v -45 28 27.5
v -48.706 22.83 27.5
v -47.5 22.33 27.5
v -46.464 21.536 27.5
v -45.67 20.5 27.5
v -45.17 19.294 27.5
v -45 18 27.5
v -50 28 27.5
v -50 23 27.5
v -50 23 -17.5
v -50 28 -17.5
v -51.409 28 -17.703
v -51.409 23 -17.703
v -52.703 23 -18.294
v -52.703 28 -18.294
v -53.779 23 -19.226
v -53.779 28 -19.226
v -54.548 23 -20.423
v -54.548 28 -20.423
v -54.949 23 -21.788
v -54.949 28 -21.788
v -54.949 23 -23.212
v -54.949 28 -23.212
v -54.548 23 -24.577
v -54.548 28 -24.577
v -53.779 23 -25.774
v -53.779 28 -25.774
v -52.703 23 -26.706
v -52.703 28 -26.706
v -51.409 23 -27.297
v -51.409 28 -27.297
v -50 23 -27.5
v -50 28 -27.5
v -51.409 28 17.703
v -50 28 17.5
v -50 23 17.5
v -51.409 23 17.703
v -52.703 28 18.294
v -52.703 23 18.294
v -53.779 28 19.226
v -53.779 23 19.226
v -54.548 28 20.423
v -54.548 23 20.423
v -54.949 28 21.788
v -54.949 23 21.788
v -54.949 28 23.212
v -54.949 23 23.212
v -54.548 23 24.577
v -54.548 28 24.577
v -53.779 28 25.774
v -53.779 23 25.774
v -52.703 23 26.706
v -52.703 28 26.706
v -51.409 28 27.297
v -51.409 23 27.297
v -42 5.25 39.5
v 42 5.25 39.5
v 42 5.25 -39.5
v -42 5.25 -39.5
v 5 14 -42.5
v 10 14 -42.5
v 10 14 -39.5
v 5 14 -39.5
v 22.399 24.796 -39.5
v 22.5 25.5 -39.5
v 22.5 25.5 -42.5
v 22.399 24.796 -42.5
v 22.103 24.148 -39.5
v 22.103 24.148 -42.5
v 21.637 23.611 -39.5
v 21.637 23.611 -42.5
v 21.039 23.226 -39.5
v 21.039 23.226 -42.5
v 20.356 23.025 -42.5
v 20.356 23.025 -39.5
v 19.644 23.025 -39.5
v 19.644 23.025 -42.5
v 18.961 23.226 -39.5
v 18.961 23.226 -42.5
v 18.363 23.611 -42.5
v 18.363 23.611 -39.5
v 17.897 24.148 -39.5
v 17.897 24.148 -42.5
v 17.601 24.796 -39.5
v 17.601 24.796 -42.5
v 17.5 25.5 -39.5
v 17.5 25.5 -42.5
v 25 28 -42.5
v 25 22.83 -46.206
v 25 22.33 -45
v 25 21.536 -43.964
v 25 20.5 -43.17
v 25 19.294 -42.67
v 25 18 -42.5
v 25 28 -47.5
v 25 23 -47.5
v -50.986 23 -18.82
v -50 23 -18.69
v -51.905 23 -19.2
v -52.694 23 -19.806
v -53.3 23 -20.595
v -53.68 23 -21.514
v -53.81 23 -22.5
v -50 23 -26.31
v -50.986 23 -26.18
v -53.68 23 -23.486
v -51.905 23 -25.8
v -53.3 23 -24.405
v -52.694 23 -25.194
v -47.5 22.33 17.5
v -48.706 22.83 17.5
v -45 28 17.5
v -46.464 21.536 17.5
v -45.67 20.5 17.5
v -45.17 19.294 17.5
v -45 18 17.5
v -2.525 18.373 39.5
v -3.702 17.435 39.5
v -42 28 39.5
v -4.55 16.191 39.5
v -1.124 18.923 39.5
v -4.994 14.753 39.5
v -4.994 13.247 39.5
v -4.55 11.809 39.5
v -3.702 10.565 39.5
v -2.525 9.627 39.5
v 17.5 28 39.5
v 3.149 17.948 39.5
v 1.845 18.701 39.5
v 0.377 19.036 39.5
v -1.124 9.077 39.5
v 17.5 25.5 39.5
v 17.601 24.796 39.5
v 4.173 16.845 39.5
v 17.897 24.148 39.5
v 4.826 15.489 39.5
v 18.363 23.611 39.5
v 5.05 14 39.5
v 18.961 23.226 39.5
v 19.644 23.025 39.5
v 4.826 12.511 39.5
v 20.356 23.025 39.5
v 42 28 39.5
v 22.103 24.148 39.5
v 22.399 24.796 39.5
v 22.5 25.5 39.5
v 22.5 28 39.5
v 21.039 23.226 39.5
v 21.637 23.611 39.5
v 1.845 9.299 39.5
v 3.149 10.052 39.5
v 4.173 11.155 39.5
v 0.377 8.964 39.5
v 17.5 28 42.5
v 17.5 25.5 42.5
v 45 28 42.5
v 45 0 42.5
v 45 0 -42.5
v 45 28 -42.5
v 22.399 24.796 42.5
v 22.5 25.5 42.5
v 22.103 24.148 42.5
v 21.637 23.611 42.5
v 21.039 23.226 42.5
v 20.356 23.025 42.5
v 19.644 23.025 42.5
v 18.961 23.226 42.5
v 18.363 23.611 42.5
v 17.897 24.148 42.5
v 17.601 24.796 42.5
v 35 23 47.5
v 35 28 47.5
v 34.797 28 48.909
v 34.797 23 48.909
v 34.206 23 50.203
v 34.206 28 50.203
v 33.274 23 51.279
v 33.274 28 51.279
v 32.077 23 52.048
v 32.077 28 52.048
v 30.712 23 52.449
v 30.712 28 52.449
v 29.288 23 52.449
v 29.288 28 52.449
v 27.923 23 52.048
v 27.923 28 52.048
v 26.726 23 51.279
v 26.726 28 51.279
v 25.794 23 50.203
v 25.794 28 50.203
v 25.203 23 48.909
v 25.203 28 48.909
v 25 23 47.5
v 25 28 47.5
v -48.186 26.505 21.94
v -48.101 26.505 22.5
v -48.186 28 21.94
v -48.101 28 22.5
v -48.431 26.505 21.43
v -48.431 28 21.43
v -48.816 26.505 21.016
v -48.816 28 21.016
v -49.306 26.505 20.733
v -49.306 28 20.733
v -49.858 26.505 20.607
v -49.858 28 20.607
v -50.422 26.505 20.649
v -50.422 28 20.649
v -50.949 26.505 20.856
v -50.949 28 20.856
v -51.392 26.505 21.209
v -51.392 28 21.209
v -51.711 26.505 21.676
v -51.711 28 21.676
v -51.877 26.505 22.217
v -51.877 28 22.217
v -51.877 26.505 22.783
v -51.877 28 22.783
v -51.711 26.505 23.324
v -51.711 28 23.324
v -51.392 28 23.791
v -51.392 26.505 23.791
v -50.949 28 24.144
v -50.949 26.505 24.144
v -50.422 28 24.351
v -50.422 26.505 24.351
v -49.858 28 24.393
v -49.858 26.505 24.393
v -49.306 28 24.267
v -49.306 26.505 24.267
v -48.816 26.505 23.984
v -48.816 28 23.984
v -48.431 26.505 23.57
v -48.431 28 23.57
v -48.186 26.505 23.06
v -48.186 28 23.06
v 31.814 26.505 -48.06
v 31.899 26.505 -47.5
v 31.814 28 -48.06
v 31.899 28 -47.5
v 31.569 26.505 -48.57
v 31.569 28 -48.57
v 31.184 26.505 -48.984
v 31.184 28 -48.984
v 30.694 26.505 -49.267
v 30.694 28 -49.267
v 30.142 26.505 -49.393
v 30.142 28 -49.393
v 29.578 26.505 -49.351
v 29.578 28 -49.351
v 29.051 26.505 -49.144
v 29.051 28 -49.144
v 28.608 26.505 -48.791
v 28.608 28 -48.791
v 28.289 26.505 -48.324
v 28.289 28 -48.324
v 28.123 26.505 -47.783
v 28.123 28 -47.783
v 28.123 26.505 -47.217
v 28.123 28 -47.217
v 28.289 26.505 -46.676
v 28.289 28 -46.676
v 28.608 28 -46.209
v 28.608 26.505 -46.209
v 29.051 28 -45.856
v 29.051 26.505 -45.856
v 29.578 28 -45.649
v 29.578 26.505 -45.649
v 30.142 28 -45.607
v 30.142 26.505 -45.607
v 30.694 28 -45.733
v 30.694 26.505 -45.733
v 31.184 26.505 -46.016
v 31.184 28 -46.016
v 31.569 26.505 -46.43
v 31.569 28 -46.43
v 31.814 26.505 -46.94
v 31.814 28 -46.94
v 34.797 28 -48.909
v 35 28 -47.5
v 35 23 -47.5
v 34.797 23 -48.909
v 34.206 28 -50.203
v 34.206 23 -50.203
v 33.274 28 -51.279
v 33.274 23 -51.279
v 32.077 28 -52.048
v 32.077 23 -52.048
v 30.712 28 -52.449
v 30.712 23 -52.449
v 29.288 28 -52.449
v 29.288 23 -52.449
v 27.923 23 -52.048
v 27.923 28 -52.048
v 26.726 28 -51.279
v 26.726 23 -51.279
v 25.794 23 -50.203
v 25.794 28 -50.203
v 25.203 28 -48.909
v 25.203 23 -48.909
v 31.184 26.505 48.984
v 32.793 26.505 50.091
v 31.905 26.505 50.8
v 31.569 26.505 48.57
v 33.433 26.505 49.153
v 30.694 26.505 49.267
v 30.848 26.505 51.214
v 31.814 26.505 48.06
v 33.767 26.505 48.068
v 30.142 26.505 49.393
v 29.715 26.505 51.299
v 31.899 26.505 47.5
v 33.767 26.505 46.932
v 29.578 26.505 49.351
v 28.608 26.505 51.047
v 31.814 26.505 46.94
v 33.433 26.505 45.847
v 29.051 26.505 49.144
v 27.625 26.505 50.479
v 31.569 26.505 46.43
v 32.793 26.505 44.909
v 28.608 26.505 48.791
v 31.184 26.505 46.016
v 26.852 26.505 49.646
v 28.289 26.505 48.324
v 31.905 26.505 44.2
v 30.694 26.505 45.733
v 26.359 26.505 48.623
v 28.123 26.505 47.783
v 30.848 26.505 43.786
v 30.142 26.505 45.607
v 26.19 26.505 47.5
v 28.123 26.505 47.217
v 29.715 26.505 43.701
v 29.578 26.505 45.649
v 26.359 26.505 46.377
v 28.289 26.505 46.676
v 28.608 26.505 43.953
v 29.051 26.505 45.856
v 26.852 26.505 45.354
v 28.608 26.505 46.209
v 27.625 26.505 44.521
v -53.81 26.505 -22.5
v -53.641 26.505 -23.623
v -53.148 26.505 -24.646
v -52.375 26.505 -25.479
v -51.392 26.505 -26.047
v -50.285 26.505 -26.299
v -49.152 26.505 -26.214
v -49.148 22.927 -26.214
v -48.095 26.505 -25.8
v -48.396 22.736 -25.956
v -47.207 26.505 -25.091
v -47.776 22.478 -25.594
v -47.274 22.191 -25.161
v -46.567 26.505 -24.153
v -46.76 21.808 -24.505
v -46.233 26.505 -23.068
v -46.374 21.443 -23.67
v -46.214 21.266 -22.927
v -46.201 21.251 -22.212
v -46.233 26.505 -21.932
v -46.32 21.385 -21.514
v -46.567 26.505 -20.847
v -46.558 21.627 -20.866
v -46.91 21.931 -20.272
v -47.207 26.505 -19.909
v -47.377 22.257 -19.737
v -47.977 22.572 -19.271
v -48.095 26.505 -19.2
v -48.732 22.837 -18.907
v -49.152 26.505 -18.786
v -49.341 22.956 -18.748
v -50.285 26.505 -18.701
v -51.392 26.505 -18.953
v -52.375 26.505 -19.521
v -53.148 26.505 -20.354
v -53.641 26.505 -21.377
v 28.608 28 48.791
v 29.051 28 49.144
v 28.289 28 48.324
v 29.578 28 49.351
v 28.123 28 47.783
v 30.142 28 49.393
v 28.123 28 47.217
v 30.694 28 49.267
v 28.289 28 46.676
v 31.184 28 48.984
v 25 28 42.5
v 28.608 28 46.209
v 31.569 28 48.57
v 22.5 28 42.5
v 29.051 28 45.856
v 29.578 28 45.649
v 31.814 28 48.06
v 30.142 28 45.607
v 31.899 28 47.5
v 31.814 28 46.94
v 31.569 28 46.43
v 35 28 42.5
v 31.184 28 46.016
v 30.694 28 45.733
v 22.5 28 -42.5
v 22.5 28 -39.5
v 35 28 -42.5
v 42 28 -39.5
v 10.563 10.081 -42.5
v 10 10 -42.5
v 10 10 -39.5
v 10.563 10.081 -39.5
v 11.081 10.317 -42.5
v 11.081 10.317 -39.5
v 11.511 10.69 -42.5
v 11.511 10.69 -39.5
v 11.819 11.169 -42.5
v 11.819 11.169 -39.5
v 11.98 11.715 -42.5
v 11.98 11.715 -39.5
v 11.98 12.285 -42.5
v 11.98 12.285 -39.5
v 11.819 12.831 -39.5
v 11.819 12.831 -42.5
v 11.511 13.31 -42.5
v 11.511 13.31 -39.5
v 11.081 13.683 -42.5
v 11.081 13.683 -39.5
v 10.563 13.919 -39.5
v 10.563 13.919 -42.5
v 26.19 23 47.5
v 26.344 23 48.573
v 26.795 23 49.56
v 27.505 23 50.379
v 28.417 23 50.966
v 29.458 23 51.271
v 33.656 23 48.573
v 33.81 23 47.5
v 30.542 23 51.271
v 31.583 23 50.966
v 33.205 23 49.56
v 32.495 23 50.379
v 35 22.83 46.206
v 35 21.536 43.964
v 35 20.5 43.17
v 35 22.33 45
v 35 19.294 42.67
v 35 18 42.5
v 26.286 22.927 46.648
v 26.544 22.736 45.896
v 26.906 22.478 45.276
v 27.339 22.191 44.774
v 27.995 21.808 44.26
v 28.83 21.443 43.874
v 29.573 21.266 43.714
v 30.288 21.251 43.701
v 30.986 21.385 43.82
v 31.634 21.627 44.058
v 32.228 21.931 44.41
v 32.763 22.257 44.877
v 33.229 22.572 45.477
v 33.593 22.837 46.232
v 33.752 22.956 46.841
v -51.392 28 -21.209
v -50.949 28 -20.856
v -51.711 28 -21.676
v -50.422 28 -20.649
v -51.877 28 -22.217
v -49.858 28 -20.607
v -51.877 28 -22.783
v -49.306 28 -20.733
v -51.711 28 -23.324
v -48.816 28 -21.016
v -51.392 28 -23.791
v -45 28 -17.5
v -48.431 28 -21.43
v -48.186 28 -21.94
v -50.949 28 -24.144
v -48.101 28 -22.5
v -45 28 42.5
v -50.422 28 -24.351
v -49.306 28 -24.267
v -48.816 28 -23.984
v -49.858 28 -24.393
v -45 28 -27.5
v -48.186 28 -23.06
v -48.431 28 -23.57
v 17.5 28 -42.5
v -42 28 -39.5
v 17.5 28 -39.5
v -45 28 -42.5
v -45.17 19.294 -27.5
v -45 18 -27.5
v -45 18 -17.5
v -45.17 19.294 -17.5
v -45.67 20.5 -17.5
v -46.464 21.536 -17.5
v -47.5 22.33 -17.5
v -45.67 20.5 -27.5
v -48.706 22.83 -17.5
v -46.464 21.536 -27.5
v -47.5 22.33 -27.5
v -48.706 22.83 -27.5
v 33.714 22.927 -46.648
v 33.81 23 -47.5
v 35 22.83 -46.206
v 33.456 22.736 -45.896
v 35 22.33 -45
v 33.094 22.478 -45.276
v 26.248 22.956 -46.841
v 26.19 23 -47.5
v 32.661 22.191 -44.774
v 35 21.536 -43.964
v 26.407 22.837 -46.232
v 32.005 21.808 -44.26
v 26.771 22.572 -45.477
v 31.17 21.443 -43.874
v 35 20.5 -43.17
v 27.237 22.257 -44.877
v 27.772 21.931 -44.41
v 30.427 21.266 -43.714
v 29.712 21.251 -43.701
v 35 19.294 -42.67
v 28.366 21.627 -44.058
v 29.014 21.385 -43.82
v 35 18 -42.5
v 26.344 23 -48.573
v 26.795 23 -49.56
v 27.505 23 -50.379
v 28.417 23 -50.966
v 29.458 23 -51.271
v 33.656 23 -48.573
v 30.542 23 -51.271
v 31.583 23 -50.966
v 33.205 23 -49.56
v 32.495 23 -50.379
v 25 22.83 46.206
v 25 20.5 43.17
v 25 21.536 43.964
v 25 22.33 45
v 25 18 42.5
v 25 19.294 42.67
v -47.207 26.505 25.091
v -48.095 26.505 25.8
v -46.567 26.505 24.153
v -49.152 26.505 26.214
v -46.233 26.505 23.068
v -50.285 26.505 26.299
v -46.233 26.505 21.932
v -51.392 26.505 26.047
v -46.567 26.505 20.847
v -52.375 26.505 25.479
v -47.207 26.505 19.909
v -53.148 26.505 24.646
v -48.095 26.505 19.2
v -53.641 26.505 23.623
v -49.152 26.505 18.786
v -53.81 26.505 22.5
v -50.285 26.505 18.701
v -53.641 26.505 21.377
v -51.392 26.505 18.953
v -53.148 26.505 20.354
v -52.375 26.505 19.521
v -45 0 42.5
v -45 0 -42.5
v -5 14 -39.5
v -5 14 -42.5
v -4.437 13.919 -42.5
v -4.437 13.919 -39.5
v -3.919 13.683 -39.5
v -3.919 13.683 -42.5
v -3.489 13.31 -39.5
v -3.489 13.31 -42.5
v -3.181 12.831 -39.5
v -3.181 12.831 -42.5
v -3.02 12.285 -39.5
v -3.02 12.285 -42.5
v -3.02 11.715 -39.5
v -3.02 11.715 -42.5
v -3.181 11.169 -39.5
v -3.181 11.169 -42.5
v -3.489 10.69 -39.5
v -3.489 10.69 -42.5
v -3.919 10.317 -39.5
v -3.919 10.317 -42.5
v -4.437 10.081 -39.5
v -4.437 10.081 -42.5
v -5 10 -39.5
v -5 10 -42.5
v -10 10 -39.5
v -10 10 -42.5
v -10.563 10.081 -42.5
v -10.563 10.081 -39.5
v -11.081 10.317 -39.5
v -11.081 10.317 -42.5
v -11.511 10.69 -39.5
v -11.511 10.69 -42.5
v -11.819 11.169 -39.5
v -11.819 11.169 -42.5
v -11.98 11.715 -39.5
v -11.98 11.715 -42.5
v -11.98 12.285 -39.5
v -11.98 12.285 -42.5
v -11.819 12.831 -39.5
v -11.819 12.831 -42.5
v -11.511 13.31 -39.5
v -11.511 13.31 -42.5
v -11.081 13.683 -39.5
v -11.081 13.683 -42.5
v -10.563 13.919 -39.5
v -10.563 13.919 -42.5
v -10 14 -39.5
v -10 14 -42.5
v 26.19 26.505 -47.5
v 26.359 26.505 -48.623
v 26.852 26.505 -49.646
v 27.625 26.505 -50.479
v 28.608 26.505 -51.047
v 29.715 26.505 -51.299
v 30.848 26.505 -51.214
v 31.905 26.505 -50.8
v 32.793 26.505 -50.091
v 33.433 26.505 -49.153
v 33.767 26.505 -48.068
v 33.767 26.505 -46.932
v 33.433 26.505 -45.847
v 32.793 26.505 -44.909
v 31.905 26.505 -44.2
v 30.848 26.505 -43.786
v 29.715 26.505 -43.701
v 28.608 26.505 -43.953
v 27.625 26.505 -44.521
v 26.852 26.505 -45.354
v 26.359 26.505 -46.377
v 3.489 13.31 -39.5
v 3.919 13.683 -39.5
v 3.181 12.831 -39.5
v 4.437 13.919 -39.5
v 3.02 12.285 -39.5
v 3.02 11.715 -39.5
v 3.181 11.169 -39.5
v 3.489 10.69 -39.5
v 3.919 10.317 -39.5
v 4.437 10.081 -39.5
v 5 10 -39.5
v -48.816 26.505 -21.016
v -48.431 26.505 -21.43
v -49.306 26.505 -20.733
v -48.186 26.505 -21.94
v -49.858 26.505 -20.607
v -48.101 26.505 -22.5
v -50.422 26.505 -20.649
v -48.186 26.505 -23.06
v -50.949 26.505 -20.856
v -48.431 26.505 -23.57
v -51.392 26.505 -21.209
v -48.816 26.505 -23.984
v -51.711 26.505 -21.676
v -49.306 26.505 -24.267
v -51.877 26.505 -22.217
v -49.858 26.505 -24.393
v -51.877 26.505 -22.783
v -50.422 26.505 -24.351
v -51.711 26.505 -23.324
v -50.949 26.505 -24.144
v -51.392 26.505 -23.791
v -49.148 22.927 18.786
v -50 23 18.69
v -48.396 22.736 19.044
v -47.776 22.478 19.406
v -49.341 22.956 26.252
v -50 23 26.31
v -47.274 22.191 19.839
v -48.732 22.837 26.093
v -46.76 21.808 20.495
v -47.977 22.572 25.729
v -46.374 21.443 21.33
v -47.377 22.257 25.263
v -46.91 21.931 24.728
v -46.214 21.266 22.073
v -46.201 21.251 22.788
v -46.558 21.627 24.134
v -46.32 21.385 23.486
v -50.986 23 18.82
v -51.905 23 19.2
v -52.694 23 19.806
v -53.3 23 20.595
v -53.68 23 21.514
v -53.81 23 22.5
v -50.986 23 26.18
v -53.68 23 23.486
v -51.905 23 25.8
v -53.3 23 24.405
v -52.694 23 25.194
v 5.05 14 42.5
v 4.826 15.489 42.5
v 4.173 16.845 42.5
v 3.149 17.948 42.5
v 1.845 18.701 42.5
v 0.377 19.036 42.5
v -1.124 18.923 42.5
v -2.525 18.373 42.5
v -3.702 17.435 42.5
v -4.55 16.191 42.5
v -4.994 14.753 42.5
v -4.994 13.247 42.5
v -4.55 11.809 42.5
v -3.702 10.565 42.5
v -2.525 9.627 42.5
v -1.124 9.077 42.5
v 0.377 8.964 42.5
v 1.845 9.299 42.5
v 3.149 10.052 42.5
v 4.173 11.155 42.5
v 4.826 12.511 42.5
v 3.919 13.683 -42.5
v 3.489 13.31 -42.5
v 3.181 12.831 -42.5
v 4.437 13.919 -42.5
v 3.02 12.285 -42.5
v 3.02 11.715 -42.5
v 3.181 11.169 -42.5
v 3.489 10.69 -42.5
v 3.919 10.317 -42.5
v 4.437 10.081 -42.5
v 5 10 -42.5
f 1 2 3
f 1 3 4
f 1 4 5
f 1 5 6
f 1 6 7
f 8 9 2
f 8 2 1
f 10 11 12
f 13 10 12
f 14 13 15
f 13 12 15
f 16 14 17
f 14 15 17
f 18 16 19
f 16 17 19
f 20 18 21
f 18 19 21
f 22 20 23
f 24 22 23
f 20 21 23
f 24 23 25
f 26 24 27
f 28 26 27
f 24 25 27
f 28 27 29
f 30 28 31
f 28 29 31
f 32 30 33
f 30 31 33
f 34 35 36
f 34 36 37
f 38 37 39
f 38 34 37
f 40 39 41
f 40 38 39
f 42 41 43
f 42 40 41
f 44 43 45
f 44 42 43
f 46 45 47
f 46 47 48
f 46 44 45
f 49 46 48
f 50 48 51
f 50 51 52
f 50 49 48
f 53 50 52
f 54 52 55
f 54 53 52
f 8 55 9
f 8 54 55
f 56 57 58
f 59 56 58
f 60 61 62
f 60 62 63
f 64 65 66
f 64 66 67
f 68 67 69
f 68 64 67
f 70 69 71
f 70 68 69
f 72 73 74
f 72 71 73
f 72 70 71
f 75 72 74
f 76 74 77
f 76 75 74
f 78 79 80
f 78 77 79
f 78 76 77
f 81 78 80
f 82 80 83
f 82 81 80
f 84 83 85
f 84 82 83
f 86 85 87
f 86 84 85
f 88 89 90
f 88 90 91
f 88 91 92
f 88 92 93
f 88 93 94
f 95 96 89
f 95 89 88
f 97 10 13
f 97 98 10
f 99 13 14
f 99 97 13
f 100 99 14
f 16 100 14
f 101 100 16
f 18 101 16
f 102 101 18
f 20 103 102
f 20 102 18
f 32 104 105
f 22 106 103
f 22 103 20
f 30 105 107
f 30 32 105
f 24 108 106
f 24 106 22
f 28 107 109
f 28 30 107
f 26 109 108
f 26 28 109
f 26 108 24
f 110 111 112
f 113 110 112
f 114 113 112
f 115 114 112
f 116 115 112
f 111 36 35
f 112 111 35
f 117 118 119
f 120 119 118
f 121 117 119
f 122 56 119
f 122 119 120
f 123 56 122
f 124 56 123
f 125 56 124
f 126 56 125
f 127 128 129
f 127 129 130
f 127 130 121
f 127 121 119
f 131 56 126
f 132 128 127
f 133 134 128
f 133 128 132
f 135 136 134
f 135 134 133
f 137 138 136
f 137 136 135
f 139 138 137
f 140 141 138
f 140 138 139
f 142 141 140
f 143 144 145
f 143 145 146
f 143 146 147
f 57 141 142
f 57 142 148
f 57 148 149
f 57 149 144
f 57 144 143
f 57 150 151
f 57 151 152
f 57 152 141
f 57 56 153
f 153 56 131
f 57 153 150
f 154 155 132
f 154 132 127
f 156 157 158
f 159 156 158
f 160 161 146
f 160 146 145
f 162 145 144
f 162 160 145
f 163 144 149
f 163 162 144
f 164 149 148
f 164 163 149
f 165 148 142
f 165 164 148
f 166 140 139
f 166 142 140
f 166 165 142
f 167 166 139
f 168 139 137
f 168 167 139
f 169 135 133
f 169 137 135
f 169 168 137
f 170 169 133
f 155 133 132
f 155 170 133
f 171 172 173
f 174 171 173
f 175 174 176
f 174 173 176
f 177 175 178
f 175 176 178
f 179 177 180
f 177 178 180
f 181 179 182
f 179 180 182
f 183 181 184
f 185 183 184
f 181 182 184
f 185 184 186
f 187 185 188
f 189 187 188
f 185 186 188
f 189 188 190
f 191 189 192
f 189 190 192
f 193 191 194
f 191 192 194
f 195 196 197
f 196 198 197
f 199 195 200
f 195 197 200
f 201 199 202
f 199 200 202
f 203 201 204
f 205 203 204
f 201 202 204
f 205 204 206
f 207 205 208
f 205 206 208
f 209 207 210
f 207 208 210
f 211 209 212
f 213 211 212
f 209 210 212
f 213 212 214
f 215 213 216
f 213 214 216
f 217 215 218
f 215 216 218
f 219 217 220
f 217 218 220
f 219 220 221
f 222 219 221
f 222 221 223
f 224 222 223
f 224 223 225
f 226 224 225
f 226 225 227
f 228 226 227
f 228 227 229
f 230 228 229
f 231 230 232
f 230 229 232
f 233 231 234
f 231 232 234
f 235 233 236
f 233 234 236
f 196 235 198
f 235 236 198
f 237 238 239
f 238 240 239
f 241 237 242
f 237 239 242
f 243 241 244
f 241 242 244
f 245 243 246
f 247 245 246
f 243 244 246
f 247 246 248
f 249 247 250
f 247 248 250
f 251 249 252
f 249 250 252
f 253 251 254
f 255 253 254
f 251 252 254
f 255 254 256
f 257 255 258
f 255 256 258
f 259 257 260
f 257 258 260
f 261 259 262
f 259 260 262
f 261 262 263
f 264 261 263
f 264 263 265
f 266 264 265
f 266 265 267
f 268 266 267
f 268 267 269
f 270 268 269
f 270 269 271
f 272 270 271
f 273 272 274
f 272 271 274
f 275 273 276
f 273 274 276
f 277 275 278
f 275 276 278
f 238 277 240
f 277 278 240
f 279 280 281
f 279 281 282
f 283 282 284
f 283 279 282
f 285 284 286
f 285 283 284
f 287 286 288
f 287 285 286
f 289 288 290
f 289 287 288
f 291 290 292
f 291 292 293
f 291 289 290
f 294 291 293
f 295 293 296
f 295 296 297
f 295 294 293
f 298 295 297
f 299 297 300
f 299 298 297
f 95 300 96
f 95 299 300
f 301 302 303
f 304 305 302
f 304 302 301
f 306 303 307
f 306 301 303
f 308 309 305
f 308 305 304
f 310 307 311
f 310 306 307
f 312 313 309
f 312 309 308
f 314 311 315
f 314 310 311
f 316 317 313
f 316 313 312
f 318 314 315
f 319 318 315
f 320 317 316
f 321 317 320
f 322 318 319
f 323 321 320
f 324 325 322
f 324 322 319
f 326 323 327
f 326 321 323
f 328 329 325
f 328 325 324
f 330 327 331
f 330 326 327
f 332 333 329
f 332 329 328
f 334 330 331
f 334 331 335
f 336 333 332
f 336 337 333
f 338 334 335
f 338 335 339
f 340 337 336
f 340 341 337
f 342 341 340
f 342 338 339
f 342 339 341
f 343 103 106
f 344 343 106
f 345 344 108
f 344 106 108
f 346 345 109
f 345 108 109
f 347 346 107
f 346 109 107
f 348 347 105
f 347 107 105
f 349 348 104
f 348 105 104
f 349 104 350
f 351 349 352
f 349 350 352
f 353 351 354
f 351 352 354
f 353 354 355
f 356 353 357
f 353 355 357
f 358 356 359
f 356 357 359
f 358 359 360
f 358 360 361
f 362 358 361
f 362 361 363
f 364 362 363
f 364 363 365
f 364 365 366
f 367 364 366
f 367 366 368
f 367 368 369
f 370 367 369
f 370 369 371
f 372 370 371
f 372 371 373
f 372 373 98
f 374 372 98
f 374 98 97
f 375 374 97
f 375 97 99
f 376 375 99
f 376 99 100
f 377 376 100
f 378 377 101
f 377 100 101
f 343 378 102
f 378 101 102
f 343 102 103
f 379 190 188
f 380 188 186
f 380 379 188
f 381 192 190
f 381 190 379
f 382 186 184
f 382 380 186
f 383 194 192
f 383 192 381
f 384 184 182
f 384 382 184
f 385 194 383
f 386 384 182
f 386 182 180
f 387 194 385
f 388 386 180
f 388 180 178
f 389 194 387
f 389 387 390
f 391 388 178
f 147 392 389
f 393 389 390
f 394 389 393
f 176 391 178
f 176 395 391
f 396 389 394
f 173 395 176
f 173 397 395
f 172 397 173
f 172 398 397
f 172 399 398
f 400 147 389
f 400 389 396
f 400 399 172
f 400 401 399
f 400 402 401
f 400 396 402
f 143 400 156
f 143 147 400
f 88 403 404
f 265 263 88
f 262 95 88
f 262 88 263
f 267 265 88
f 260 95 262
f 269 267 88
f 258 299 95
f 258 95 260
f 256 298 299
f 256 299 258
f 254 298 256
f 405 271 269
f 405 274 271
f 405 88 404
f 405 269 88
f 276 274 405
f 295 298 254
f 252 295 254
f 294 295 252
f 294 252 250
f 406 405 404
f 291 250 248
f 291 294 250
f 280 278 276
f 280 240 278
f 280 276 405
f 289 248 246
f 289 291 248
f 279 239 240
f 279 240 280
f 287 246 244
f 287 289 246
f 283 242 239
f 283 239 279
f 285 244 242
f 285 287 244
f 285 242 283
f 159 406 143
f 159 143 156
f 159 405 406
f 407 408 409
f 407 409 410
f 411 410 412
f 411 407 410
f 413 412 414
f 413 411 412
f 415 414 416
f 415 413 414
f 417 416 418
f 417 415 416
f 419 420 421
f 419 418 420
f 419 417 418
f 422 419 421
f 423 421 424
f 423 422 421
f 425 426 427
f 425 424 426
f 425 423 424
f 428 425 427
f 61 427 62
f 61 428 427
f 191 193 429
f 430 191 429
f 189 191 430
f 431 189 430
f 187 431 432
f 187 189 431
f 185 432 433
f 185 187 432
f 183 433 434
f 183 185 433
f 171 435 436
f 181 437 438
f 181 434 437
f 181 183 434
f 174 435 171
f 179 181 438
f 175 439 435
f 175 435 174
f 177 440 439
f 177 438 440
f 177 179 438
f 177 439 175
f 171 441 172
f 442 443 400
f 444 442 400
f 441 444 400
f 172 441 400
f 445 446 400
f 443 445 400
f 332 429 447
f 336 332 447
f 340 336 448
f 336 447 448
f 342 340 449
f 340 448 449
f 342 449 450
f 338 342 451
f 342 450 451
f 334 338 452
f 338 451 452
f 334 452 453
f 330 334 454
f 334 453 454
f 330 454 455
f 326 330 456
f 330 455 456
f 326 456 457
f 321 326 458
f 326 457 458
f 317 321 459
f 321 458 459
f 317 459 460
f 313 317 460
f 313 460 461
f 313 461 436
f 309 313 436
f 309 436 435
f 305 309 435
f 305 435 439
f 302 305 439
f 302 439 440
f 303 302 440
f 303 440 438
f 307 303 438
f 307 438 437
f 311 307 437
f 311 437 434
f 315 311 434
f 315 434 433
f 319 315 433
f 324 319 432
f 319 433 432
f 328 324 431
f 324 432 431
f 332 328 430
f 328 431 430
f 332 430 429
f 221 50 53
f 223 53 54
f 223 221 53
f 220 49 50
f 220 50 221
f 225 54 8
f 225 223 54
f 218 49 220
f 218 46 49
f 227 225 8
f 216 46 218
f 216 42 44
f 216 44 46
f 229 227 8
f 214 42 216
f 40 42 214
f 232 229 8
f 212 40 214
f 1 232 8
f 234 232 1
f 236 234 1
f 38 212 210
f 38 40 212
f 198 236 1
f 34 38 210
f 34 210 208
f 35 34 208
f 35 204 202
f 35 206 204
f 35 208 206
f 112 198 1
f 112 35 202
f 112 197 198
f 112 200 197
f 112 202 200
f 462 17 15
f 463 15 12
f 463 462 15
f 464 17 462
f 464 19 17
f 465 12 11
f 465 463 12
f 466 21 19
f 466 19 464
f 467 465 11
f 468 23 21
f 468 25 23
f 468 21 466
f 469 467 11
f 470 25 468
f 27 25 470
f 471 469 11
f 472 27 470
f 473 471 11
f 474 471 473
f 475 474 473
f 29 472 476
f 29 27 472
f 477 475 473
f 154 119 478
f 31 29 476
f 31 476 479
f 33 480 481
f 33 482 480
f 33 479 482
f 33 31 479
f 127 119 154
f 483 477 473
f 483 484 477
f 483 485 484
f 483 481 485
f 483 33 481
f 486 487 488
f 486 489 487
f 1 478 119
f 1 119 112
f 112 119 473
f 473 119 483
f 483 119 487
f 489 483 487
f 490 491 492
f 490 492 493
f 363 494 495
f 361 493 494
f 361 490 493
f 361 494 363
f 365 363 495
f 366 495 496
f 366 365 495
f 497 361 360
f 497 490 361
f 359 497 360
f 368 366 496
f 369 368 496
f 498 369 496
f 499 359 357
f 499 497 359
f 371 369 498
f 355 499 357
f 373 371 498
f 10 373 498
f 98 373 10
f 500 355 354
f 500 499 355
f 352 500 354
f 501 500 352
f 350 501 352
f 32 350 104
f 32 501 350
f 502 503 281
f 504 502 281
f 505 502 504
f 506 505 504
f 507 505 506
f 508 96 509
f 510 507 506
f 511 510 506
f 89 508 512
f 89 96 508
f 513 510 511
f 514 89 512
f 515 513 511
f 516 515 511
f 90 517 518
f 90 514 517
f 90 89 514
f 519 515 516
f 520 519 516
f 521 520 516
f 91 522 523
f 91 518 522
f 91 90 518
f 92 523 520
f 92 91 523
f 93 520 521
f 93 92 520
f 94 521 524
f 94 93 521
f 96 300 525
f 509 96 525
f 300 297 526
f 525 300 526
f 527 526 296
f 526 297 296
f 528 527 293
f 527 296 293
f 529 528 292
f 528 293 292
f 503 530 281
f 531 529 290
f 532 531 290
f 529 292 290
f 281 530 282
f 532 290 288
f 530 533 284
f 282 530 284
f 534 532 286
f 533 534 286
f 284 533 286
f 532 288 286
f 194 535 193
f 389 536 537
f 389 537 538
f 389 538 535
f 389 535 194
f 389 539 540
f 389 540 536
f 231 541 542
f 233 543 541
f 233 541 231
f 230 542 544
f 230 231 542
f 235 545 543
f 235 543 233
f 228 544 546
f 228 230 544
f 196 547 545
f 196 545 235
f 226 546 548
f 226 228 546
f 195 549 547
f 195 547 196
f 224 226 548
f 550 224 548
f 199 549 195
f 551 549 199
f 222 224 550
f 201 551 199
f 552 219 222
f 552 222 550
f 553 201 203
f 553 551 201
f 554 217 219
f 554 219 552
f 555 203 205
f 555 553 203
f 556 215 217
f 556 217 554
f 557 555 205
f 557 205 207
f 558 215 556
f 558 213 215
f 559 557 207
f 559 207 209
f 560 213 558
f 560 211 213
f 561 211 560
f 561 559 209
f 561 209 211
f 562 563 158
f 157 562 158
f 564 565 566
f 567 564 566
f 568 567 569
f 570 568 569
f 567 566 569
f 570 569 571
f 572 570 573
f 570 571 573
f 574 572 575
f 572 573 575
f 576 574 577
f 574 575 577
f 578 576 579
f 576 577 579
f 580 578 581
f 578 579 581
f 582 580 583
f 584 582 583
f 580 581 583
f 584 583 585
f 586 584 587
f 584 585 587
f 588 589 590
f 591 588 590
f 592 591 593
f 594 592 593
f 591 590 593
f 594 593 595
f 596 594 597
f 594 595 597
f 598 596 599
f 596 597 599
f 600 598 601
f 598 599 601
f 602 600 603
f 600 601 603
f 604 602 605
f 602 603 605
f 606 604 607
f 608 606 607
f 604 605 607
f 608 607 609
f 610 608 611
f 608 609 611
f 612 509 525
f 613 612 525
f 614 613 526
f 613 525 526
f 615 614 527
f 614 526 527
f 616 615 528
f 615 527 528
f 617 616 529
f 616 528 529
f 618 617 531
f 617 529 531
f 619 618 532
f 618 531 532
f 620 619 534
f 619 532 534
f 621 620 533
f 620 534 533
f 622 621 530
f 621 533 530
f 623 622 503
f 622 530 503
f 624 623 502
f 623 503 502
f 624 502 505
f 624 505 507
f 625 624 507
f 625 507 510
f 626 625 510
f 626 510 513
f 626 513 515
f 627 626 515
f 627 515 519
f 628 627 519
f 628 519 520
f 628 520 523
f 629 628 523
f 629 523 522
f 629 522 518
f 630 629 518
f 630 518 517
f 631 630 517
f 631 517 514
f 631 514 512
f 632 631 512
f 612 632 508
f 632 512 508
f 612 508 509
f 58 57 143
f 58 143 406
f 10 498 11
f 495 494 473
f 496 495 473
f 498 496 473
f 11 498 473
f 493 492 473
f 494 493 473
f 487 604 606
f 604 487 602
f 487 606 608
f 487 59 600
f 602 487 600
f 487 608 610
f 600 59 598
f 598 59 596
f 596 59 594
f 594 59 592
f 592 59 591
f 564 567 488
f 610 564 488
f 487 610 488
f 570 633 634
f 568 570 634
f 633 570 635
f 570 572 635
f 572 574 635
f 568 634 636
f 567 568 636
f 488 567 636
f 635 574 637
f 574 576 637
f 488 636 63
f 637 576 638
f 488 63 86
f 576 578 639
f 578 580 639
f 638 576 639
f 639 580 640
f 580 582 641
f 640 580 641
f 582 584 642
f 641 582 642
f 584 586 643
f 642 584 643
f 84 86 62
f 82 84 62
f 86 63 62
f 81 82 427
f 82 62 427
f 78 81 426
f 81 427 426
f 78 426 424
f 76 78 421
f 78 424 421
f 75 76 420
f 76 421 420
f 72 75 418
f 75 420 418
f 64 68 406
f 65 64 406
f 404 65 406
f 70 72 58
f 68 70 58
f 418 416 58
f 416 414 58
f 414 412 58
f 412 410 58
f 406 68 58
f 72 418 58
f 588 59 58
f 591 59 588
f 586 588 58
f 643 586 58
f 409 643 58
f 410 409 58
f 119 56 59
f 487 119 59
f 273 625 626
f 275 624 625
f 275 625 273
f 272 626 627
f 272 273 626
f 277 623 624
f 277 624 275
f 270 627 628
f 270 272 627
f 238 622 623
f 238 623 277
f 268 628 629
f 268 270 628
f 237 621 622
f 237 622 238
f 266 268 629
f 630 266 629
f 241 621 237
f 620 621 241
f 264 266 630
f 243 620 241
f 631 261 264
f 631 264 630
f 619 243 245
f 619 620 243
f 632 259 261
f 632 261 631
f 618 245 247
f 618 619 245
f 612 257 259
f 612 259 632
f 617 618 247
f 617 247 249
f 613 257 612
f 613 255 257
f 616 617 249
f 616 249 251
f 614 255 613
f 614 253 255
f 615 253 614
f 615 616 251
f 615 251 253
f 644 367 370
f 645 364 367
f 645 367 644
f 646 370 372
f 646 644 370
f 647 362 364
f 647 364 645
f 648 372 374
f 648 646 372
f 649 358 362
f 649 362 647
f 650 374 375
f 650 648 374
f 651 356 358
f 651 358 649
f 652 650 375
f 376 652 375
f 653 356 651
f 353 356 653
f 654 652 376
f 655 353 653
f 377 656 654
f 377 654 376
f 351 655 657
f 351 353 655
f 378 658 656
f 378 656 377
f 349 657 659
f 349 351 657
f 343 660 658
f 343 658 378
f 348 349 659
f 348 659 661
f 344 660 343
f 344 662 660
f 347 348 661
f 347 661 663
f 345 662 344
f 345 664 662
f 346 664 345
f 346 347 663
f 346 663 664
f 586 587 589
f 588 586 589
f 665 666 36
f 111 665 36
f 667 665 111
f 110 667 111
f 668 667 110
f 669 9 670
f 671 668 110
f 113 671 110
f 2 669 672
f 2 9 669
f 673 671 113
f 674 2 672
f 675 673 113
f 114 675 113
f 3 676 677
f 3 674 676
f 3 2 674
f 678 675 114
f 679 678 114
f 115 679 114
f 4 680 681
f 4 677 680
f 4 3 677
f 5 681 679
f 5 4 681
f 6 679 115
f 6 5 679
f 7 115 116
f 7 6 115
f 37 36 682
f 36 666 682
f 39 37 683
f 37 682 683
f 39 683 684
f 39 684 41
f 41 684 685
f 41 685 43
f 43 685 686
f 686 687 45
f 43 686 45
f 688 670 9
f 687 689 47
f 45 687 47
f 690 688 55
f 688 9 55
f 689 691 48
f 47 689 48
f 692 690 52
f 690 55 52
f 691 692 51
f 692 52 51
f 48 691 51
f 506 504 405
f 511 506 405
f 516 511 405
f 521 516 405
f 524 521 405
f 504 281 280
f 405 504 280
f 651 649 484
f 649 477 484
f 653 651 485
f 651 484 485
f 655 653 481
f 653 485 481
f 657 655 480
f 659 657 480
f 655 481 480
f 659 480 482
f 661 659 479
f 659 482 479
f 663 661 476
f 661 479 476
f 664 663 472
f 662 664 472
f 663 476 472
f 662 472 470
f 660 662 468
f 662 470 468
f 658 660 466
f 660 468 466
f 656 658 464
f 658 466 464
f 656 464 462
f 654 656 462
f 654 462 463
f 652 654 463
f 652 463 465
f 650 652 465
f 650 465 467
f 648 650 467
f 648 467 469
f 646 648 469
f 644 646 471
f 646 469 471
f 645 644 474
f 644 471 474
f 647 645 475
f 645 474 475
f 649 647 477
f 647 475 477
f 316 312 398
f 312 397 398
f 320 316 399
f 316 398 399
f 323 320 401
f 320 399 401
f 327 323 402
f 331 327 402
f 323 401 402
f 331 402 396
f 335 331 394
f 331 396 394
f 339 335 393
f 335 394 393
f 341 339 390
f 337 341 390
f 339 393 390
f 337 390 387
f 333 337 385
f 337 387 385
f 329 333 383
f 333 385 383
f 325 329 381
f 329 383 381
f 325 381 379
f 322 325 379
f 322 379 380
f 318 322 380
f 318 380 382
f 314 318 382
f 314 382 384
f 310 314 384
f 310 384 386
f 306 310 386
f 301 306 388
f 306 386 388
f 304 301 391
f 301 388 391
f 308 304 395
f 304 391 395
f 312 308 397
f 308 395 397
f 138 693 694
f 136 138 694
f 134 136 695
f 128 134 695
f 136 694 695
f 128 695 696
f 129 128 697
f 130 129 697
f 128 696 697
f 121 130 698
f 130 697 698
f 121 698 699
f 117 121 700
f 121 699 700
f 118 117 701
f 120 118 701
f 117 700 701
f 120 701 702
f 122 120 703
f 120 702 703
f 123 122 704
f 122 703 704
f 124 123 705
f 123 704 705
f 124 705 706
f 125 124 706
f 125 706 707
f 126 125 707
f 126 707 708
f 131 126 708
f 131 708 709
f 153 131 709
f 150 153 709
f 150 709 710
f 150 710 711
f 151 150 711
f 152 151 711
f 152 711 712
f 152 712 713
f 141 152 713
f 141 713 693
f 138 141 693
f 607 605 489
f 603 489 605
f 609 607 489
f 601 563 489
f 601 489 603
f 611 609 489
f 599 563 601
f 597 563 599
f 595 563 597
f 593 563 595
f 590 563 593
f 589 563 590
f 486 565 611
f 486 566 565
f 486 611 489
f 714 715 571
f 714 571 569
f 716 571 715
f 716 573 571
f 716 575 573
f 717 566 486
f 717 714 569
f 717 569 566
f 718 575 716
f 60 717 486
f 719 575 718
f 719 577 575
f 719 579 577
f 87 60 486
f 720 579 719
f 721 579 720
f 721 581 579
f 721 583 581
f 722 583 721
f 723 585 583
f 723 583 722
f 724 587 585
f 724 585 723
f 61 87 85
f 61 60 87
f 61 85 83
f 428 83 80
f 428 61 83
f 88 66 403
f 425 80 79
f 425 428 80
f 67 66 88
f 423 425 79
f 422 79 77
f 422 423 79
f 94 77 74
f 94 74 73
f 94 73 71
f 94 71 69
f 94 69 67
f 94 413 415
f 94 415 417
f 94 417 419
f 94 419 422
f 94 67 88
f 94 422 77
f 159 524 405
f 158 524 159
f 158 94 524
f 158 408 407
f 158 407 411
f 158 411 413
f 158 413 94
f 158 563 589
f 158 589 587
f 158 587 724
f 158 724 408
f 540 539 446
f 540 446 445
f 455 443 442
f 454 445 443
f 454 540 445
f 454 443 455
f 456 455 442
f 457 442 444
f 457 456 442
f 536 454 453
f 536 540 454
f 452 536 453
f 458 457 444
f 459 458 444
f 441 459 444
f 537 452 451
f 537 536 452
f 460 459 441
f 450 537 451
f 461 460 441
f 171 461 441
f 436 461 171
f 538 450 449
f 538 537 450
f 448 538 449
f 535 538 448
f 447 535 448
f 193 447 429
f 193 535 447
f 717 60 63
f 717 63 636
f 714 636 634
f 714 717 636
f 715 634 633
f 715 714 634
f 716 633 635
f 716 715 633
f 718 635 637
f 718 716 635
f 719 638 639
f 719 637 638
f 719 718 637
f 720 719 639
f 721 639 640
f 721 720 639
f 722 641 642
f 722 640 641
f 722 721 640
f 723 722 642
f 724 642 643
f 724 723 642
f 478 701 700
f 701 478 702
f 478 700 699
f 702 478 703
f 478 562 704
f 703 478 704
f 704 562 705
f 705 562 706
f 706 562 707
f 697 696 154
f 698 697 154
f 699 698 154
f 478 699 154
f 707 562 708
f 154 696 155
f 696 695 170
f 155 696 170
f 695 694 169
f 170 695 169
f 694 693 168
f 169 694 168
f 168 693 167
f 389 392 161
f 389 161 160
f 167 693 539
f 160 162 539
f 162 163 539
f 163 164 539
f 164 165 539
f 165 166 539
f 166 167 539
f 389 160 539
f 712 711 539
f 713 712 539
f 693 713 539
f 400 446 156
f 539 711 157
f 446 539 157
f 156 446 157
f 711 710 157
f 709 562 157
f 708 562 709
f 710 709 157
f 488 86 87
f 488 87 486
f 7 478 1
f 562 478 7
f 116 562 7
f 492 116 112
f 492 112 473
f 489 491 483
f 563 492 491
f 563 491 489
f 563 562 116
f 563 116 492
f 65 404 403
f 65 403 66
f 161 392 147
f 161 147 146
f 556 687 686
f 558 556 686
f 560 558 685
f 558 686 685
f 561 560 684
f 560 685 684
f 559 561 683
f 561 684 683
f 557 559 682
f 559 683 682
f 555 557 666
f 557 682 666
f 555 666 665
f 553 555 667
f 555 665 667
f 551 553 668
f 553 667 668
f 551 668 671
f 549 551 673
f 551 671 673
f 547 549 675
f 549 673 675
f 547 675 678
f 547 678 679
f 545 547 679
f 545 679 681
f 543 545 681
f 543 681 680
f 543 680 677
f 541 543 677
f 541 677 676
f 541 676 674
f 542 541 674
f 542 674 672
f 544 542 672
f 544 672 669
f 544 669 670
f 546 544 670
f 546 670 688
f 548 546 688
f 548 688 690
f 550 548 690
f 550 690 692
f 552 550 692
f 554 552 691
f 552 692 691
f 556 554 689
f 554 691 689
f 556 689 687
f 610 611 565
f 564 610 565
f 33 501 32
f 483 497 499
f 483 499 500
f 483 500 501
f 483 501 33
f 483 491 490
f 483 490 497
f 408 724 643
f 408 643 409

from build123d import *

# Parameters (mm, degrees)
SKETCH1_W                                      = 90
SKETCH1_H                                      = 85
BOSS_EXTRUDE1_DEPTH                            = 28
SHELL1_T                                       = -3
SHELL1_THICKNESS_2_FACE_W                      = 79
SHELL1_THICKNESS_2_FACE_H                      = 84
SHELL1_THICKNESS_2_DEPTH                       = 2.25
CUT_EXTRUDE1_REACH                             = 102.17
SKETCH2_R                                      = 5.05
BOSS_EXTRUDE2_DEPTH                            = 5
BOSS_EXTRUDE3_DEPTH                            = 5
CBORE_FOR_6_SOCKET_HEAD_CAP_SCREW1_D           = 3.7973
CBORE_FOR_6_SOCKET_HEAD_CAP_SCREW1_CBORE_D     = 7.62
CBORE_FOR_6_SOCKET_HEAD_CAP_SCREW1_CBORE_DEPTH = 3.5052
FILLET1_R                                      = 5
CUT_EXTRUDE2_DEPTH                             = 114.287245531
CUT_EXTRUDE4_REACH                             = 124.741


with BuildPart() as part:
    # Sketch1 → Boss-Extrude1 (new body)
    with BuildSketch(Plane(origin=(0, 0, 0), x_dir=(1, 0, 0), z_dir=(0, 1, 0))):
        Rectangle(SKETCH1_W, SKETCH1_H)
    extrude(amount=BOSS_EXTRUDE1_DEPTH)

    # Shell1
    shell1_openings = [part.faces().sort_by_distance(p)[0] for p in [
        (0, 28, 0),
    ]]
    offset(amount=SHELL1_T, openings=shell1_openings, kind=Kind.INTERSECTION)

    # Shell1 thickness 2 face (on inner face of the shell) → Shell1 thickness 2 (add)
    with BuildSketch(Plane(origin=(0, 3, 0), x_dir=(0, 0, -1), z_dir=(0, -1, 0))):
        Rectangle(SHELL1_THICKNESS_2_FACE_W, SHELL1_THICKNESS_2_FACE_H)
    extrude(amount=-SHELL1_THICKNESS_2_DEPTH)

    # Sketch2 → Cut-Extrude1 (cut, up to next)
    with BuildSketch(Plane.XY.offset(42.5), mode=Mode.PRIVATE) as cut_extrude1_sk1:
        with Locations((0, 14)):
            Circle(SKETCH2_R)
    cut_extrude1_tool1 = extrude(cut_extrude1_sk1.sketch, amount=-CUT_EXTRUDE1_REACH, mode=Mode.PRIVATE) & part.part
    add(cut_extrude1_tool1.solids().sort_by_distance((0, 14, 42.5))[0], mode=Mode.SUBTRACT)

    # Sketch3 → Boss-Extrude2 (add)
    with BuildSketch(Plane(origin=(0, 28, 0), x_dir=(1, 0, 0), z_dir=(0, 1, 0))):
        with BuildLine():
            Line((-50, 27.5), (-45, 27.5))
            Line((-45, 27.5), (-45, 17.5))
            Line((-45, 17.5), (-50, 17.5))
            ThreePointArc((-50, 17.5), (-55, 22.5), (-50, 27.5))
        make_face()
    boss_extrude2 = extrude(amount=-BOSS_EXTRUDE2_DEPTH)

    # Mirror1: Boss-Extrude2 across plane
    add(boss_extrude2.mirror(Plane.XY))

    # Sketch4 → Boss-Extrude3 (add)
    with BuildSketch(Plane(origin=(0, 28, 0), x_dir=(1, 0, 0), z_dir=(0, 1, 0))):
        with BuildLine():
            Line((25, 47.5), (25, 42.5))
            Line((25, 42.5), (35, 42.5))
            Line((35, 42.5), (35, 47.5))
            ThreePointArc((35, 47.5), (30, 52.5), (25, 47.5))
        make_face()
    boss_extrude3 = extrude(amount=-BOSS_EXTRUDE3_DEPTH)

    # Mirror2: Boss-Extrude3 across plane
    add(boss_extrude3.mirror(Plane.XY))

    # CBORE for #6 Socket Head Cap Screw1 (through all)
    with Locations(Plane(origin=(0, 23, 0), x_dir=(-1, 0, 0), z_dir=(0, -1, 0))):
        with Locations((-30, 47.5), (-30, -47.5), (50, -22.5), (50, 22.5)):
            CounterBoreHole(CBORE_FOR_6_SOCKET_HEAD_CAP_SCREW1_D / 2, CBORE_FOR_6_SOCKET_HEAD_CAP_SCREW1_CBORE_D / 2, CBORE_FOR_6_SOCKET_HEAD_CAP_SCREW1_CBORE_DEPTH)

    # Fillet1
    # the kernel refuses this fillet: 5 mm, written as the material it adds along each edge
    with BuildSketch(Plane(origin=(25, 23, -42.5), x_dir=(0, -1, 0), z_dir=(1, 0, 0))) as fillet1_piece_1_section:
        with BuildLine():
            CenterArc((FILLET1_R, FILLET1_R), FILLET1_R, 180, 90)
            Line((0, FILLET1_R), (0, 0))
            Line((0, 0), (FILLET1_R, 0))
        make_face()
    fillet1_piece_1 = extrude(amount=10, mode=Mode.PRIVATE)
    fillet1_piece_1 = fillet1_piece_1 - Plane(origin=(30, 21.803509944, -47.5), x_dir=(-1, 0, 0), z_dir=(0, -1, 0)) * Cylinder(3.81, 40, mode=Mode.PRIVATE)
    add(fillet1_piece_1)
    with BuildSketch(Plane(origin=(25, 23, 42.5), x_dir=(0, -1, 0), z_dir=(1, 0, 0))) as fillet1_piece_2_section:
        with BuildLine():
            CenterArc((FILLET1_R, -FILLET1_R), FILLET1_R, 90, 90)
            Line((0, -FILLET1_R), (0, 0))
            Line((0, 0), (FILLET1_R, 0))
        make_face()
    fillet1_piece_2 = extrude(amount=10, mode=Mode.PRIVATE)
    fillet1_piece_2 = fillet1_piece_2 - Plane(origin=(30, 21.803509344, 47.5), x_dir=(-1, 0, 0), z_dir=(0, -1, 0)) * Cylinder(3.81, 40, mode=Mode.PRIVATE)
    add(fillet1_piece_2)
    with BuildSketch(Plane(origin=(-45, 23, -27.5), x_dir=(0, -1, 0), z_dir=(0, 0, 1))) as fillet1_piece_3_section:
        with BuildLine():
            CenterArc((FILLET1_R, -FILLET1_R), FILLET1_R, 90, 90)
            Line((0, -FILLET1_R), (0, 0))
            Line((0, 0), (FILLET1_R, 0))
        make_face()
    fillet1_piece_3 = extrude(amount=10, mode=Mode.PRIVATE)
    fillet1_piece_3 = fillet1_piece_3 - Plane(origin=(-50, 21.803509344, -22.5), x_dir=(-1, 0, 0), z_dir=(0, -1, 0)) * Cylinder(3.81, 40, mode=Mode.PRIVATE)
    add(fillet1_piece_3)
    with BuildSketch(Plane(origin=(-45, 23, 27.5), x_dir=(0, -1, 0), z_dir=(0, 0, -1))) as fillet1_piece_4_section:
        with BuildLine():
            CenterArc((FILLET1_R, FILLET1_R), FILLET1_R, 180, 90)
            Line((0, FILLET1_R), (0, 0))
            Line((0, 0), (FILLET1_R, 0))
        make_face()
    fillet1_piece_4 = extrude(amount=10, mode=Mode.PRIVATE)
    fillet1_piece_4 = fillet1_piece_4 - Plane(origin=(-50, 21.803509944, 22.5), x_dir=(-1, 0, 0), z_dir=(0, -1, 0)) * Cylinder(3.81, 40, mode=Mode.PRIVATE)
    add(fillet1_piece_4)

    # Sketch9 → Cut-Extrude2 (cut, through all)
    with BuildSketch(Plane.XY.offset(42.5)):
        with BuildLine():
            Line((22.5, 28), (22.5, 25.5))
            ThreePointArc((22.5, 25.5), (20, 23), (17.5, 25.5))
            Line((17.5, 25.5), (17.5, 28))
            ThreePointArc((17.5, 28), (20, 30.5), (22.5, 28))
        make_face()
    extrude(amount=-CUT_EXTRUDE2_DEPTH, mode=Mode.SUBTRACT)

    # Sketch10 → Cut-Extrude4 (cut, up to next)
    with BuildSketch(Plane(origin=(17.5, 0, -42.5), x_dir=(1, 0, 0), z_dir=(0, 0, 1)), mode=Mode.PRIVATE) as cut_extrude4_sk1:
        with BuildLine():
            Line((-27.5, 14), (-22.5, 14))
            ThreePointArc((-22.5, 14), (-20.5, 12), (-22.5, 10))
            Line((-22.5, 10), (-27.5, 10))
            ThreePointArc((-27.5, 10), (-29.5, 12), (-27.5, 14))
        make_face()
    cut_extrude4_tool1 = extrude(cut_extrude4_sk1.sketch, amount=CUT_EXTRUDE4_REACH, mode=Mode.PRIVATE) & part.part
    # Sketch10 → Cut-Extrude4 (cut, up to next)
    with BuildSketch(Plane(origin=(17.5, 0, -42.5), x_dir=(1, 0, 0), z_dir=(0, 0, 1)), mode=Mode.PRIVATE) as cut_extrude4_sk2:
        with BuildLine():
            Line((-7.5, 14), (-12.5, 14))
            ThreePointArc((-12.5, 14), (-14.5, 12), (-12.5, 10))
            Line((-12.5, 10), (-7.5, 10))
            ThreePointArc((-7.5, 10), (-5.5, 12), (-7.5, 14))
        make_face()
    cut_extrude4_tool2 = extrude(cut_extrude4_sk2.sketch, amount=CUT_EXTRUDE4_REACH, mode=Mode.PRIVATE) & part.part
    add(cut_extrude4_tool1.solids().sort_by_distance((-7.5, 12, -42.5))[0], mode=Mode.SUBTRACT)
    add(cut_extrude4_tool2.solids().sort_by_distance((7.5, 12, -42.5))[0], mode=Mode.SUBTRACT)


solid = part.part
